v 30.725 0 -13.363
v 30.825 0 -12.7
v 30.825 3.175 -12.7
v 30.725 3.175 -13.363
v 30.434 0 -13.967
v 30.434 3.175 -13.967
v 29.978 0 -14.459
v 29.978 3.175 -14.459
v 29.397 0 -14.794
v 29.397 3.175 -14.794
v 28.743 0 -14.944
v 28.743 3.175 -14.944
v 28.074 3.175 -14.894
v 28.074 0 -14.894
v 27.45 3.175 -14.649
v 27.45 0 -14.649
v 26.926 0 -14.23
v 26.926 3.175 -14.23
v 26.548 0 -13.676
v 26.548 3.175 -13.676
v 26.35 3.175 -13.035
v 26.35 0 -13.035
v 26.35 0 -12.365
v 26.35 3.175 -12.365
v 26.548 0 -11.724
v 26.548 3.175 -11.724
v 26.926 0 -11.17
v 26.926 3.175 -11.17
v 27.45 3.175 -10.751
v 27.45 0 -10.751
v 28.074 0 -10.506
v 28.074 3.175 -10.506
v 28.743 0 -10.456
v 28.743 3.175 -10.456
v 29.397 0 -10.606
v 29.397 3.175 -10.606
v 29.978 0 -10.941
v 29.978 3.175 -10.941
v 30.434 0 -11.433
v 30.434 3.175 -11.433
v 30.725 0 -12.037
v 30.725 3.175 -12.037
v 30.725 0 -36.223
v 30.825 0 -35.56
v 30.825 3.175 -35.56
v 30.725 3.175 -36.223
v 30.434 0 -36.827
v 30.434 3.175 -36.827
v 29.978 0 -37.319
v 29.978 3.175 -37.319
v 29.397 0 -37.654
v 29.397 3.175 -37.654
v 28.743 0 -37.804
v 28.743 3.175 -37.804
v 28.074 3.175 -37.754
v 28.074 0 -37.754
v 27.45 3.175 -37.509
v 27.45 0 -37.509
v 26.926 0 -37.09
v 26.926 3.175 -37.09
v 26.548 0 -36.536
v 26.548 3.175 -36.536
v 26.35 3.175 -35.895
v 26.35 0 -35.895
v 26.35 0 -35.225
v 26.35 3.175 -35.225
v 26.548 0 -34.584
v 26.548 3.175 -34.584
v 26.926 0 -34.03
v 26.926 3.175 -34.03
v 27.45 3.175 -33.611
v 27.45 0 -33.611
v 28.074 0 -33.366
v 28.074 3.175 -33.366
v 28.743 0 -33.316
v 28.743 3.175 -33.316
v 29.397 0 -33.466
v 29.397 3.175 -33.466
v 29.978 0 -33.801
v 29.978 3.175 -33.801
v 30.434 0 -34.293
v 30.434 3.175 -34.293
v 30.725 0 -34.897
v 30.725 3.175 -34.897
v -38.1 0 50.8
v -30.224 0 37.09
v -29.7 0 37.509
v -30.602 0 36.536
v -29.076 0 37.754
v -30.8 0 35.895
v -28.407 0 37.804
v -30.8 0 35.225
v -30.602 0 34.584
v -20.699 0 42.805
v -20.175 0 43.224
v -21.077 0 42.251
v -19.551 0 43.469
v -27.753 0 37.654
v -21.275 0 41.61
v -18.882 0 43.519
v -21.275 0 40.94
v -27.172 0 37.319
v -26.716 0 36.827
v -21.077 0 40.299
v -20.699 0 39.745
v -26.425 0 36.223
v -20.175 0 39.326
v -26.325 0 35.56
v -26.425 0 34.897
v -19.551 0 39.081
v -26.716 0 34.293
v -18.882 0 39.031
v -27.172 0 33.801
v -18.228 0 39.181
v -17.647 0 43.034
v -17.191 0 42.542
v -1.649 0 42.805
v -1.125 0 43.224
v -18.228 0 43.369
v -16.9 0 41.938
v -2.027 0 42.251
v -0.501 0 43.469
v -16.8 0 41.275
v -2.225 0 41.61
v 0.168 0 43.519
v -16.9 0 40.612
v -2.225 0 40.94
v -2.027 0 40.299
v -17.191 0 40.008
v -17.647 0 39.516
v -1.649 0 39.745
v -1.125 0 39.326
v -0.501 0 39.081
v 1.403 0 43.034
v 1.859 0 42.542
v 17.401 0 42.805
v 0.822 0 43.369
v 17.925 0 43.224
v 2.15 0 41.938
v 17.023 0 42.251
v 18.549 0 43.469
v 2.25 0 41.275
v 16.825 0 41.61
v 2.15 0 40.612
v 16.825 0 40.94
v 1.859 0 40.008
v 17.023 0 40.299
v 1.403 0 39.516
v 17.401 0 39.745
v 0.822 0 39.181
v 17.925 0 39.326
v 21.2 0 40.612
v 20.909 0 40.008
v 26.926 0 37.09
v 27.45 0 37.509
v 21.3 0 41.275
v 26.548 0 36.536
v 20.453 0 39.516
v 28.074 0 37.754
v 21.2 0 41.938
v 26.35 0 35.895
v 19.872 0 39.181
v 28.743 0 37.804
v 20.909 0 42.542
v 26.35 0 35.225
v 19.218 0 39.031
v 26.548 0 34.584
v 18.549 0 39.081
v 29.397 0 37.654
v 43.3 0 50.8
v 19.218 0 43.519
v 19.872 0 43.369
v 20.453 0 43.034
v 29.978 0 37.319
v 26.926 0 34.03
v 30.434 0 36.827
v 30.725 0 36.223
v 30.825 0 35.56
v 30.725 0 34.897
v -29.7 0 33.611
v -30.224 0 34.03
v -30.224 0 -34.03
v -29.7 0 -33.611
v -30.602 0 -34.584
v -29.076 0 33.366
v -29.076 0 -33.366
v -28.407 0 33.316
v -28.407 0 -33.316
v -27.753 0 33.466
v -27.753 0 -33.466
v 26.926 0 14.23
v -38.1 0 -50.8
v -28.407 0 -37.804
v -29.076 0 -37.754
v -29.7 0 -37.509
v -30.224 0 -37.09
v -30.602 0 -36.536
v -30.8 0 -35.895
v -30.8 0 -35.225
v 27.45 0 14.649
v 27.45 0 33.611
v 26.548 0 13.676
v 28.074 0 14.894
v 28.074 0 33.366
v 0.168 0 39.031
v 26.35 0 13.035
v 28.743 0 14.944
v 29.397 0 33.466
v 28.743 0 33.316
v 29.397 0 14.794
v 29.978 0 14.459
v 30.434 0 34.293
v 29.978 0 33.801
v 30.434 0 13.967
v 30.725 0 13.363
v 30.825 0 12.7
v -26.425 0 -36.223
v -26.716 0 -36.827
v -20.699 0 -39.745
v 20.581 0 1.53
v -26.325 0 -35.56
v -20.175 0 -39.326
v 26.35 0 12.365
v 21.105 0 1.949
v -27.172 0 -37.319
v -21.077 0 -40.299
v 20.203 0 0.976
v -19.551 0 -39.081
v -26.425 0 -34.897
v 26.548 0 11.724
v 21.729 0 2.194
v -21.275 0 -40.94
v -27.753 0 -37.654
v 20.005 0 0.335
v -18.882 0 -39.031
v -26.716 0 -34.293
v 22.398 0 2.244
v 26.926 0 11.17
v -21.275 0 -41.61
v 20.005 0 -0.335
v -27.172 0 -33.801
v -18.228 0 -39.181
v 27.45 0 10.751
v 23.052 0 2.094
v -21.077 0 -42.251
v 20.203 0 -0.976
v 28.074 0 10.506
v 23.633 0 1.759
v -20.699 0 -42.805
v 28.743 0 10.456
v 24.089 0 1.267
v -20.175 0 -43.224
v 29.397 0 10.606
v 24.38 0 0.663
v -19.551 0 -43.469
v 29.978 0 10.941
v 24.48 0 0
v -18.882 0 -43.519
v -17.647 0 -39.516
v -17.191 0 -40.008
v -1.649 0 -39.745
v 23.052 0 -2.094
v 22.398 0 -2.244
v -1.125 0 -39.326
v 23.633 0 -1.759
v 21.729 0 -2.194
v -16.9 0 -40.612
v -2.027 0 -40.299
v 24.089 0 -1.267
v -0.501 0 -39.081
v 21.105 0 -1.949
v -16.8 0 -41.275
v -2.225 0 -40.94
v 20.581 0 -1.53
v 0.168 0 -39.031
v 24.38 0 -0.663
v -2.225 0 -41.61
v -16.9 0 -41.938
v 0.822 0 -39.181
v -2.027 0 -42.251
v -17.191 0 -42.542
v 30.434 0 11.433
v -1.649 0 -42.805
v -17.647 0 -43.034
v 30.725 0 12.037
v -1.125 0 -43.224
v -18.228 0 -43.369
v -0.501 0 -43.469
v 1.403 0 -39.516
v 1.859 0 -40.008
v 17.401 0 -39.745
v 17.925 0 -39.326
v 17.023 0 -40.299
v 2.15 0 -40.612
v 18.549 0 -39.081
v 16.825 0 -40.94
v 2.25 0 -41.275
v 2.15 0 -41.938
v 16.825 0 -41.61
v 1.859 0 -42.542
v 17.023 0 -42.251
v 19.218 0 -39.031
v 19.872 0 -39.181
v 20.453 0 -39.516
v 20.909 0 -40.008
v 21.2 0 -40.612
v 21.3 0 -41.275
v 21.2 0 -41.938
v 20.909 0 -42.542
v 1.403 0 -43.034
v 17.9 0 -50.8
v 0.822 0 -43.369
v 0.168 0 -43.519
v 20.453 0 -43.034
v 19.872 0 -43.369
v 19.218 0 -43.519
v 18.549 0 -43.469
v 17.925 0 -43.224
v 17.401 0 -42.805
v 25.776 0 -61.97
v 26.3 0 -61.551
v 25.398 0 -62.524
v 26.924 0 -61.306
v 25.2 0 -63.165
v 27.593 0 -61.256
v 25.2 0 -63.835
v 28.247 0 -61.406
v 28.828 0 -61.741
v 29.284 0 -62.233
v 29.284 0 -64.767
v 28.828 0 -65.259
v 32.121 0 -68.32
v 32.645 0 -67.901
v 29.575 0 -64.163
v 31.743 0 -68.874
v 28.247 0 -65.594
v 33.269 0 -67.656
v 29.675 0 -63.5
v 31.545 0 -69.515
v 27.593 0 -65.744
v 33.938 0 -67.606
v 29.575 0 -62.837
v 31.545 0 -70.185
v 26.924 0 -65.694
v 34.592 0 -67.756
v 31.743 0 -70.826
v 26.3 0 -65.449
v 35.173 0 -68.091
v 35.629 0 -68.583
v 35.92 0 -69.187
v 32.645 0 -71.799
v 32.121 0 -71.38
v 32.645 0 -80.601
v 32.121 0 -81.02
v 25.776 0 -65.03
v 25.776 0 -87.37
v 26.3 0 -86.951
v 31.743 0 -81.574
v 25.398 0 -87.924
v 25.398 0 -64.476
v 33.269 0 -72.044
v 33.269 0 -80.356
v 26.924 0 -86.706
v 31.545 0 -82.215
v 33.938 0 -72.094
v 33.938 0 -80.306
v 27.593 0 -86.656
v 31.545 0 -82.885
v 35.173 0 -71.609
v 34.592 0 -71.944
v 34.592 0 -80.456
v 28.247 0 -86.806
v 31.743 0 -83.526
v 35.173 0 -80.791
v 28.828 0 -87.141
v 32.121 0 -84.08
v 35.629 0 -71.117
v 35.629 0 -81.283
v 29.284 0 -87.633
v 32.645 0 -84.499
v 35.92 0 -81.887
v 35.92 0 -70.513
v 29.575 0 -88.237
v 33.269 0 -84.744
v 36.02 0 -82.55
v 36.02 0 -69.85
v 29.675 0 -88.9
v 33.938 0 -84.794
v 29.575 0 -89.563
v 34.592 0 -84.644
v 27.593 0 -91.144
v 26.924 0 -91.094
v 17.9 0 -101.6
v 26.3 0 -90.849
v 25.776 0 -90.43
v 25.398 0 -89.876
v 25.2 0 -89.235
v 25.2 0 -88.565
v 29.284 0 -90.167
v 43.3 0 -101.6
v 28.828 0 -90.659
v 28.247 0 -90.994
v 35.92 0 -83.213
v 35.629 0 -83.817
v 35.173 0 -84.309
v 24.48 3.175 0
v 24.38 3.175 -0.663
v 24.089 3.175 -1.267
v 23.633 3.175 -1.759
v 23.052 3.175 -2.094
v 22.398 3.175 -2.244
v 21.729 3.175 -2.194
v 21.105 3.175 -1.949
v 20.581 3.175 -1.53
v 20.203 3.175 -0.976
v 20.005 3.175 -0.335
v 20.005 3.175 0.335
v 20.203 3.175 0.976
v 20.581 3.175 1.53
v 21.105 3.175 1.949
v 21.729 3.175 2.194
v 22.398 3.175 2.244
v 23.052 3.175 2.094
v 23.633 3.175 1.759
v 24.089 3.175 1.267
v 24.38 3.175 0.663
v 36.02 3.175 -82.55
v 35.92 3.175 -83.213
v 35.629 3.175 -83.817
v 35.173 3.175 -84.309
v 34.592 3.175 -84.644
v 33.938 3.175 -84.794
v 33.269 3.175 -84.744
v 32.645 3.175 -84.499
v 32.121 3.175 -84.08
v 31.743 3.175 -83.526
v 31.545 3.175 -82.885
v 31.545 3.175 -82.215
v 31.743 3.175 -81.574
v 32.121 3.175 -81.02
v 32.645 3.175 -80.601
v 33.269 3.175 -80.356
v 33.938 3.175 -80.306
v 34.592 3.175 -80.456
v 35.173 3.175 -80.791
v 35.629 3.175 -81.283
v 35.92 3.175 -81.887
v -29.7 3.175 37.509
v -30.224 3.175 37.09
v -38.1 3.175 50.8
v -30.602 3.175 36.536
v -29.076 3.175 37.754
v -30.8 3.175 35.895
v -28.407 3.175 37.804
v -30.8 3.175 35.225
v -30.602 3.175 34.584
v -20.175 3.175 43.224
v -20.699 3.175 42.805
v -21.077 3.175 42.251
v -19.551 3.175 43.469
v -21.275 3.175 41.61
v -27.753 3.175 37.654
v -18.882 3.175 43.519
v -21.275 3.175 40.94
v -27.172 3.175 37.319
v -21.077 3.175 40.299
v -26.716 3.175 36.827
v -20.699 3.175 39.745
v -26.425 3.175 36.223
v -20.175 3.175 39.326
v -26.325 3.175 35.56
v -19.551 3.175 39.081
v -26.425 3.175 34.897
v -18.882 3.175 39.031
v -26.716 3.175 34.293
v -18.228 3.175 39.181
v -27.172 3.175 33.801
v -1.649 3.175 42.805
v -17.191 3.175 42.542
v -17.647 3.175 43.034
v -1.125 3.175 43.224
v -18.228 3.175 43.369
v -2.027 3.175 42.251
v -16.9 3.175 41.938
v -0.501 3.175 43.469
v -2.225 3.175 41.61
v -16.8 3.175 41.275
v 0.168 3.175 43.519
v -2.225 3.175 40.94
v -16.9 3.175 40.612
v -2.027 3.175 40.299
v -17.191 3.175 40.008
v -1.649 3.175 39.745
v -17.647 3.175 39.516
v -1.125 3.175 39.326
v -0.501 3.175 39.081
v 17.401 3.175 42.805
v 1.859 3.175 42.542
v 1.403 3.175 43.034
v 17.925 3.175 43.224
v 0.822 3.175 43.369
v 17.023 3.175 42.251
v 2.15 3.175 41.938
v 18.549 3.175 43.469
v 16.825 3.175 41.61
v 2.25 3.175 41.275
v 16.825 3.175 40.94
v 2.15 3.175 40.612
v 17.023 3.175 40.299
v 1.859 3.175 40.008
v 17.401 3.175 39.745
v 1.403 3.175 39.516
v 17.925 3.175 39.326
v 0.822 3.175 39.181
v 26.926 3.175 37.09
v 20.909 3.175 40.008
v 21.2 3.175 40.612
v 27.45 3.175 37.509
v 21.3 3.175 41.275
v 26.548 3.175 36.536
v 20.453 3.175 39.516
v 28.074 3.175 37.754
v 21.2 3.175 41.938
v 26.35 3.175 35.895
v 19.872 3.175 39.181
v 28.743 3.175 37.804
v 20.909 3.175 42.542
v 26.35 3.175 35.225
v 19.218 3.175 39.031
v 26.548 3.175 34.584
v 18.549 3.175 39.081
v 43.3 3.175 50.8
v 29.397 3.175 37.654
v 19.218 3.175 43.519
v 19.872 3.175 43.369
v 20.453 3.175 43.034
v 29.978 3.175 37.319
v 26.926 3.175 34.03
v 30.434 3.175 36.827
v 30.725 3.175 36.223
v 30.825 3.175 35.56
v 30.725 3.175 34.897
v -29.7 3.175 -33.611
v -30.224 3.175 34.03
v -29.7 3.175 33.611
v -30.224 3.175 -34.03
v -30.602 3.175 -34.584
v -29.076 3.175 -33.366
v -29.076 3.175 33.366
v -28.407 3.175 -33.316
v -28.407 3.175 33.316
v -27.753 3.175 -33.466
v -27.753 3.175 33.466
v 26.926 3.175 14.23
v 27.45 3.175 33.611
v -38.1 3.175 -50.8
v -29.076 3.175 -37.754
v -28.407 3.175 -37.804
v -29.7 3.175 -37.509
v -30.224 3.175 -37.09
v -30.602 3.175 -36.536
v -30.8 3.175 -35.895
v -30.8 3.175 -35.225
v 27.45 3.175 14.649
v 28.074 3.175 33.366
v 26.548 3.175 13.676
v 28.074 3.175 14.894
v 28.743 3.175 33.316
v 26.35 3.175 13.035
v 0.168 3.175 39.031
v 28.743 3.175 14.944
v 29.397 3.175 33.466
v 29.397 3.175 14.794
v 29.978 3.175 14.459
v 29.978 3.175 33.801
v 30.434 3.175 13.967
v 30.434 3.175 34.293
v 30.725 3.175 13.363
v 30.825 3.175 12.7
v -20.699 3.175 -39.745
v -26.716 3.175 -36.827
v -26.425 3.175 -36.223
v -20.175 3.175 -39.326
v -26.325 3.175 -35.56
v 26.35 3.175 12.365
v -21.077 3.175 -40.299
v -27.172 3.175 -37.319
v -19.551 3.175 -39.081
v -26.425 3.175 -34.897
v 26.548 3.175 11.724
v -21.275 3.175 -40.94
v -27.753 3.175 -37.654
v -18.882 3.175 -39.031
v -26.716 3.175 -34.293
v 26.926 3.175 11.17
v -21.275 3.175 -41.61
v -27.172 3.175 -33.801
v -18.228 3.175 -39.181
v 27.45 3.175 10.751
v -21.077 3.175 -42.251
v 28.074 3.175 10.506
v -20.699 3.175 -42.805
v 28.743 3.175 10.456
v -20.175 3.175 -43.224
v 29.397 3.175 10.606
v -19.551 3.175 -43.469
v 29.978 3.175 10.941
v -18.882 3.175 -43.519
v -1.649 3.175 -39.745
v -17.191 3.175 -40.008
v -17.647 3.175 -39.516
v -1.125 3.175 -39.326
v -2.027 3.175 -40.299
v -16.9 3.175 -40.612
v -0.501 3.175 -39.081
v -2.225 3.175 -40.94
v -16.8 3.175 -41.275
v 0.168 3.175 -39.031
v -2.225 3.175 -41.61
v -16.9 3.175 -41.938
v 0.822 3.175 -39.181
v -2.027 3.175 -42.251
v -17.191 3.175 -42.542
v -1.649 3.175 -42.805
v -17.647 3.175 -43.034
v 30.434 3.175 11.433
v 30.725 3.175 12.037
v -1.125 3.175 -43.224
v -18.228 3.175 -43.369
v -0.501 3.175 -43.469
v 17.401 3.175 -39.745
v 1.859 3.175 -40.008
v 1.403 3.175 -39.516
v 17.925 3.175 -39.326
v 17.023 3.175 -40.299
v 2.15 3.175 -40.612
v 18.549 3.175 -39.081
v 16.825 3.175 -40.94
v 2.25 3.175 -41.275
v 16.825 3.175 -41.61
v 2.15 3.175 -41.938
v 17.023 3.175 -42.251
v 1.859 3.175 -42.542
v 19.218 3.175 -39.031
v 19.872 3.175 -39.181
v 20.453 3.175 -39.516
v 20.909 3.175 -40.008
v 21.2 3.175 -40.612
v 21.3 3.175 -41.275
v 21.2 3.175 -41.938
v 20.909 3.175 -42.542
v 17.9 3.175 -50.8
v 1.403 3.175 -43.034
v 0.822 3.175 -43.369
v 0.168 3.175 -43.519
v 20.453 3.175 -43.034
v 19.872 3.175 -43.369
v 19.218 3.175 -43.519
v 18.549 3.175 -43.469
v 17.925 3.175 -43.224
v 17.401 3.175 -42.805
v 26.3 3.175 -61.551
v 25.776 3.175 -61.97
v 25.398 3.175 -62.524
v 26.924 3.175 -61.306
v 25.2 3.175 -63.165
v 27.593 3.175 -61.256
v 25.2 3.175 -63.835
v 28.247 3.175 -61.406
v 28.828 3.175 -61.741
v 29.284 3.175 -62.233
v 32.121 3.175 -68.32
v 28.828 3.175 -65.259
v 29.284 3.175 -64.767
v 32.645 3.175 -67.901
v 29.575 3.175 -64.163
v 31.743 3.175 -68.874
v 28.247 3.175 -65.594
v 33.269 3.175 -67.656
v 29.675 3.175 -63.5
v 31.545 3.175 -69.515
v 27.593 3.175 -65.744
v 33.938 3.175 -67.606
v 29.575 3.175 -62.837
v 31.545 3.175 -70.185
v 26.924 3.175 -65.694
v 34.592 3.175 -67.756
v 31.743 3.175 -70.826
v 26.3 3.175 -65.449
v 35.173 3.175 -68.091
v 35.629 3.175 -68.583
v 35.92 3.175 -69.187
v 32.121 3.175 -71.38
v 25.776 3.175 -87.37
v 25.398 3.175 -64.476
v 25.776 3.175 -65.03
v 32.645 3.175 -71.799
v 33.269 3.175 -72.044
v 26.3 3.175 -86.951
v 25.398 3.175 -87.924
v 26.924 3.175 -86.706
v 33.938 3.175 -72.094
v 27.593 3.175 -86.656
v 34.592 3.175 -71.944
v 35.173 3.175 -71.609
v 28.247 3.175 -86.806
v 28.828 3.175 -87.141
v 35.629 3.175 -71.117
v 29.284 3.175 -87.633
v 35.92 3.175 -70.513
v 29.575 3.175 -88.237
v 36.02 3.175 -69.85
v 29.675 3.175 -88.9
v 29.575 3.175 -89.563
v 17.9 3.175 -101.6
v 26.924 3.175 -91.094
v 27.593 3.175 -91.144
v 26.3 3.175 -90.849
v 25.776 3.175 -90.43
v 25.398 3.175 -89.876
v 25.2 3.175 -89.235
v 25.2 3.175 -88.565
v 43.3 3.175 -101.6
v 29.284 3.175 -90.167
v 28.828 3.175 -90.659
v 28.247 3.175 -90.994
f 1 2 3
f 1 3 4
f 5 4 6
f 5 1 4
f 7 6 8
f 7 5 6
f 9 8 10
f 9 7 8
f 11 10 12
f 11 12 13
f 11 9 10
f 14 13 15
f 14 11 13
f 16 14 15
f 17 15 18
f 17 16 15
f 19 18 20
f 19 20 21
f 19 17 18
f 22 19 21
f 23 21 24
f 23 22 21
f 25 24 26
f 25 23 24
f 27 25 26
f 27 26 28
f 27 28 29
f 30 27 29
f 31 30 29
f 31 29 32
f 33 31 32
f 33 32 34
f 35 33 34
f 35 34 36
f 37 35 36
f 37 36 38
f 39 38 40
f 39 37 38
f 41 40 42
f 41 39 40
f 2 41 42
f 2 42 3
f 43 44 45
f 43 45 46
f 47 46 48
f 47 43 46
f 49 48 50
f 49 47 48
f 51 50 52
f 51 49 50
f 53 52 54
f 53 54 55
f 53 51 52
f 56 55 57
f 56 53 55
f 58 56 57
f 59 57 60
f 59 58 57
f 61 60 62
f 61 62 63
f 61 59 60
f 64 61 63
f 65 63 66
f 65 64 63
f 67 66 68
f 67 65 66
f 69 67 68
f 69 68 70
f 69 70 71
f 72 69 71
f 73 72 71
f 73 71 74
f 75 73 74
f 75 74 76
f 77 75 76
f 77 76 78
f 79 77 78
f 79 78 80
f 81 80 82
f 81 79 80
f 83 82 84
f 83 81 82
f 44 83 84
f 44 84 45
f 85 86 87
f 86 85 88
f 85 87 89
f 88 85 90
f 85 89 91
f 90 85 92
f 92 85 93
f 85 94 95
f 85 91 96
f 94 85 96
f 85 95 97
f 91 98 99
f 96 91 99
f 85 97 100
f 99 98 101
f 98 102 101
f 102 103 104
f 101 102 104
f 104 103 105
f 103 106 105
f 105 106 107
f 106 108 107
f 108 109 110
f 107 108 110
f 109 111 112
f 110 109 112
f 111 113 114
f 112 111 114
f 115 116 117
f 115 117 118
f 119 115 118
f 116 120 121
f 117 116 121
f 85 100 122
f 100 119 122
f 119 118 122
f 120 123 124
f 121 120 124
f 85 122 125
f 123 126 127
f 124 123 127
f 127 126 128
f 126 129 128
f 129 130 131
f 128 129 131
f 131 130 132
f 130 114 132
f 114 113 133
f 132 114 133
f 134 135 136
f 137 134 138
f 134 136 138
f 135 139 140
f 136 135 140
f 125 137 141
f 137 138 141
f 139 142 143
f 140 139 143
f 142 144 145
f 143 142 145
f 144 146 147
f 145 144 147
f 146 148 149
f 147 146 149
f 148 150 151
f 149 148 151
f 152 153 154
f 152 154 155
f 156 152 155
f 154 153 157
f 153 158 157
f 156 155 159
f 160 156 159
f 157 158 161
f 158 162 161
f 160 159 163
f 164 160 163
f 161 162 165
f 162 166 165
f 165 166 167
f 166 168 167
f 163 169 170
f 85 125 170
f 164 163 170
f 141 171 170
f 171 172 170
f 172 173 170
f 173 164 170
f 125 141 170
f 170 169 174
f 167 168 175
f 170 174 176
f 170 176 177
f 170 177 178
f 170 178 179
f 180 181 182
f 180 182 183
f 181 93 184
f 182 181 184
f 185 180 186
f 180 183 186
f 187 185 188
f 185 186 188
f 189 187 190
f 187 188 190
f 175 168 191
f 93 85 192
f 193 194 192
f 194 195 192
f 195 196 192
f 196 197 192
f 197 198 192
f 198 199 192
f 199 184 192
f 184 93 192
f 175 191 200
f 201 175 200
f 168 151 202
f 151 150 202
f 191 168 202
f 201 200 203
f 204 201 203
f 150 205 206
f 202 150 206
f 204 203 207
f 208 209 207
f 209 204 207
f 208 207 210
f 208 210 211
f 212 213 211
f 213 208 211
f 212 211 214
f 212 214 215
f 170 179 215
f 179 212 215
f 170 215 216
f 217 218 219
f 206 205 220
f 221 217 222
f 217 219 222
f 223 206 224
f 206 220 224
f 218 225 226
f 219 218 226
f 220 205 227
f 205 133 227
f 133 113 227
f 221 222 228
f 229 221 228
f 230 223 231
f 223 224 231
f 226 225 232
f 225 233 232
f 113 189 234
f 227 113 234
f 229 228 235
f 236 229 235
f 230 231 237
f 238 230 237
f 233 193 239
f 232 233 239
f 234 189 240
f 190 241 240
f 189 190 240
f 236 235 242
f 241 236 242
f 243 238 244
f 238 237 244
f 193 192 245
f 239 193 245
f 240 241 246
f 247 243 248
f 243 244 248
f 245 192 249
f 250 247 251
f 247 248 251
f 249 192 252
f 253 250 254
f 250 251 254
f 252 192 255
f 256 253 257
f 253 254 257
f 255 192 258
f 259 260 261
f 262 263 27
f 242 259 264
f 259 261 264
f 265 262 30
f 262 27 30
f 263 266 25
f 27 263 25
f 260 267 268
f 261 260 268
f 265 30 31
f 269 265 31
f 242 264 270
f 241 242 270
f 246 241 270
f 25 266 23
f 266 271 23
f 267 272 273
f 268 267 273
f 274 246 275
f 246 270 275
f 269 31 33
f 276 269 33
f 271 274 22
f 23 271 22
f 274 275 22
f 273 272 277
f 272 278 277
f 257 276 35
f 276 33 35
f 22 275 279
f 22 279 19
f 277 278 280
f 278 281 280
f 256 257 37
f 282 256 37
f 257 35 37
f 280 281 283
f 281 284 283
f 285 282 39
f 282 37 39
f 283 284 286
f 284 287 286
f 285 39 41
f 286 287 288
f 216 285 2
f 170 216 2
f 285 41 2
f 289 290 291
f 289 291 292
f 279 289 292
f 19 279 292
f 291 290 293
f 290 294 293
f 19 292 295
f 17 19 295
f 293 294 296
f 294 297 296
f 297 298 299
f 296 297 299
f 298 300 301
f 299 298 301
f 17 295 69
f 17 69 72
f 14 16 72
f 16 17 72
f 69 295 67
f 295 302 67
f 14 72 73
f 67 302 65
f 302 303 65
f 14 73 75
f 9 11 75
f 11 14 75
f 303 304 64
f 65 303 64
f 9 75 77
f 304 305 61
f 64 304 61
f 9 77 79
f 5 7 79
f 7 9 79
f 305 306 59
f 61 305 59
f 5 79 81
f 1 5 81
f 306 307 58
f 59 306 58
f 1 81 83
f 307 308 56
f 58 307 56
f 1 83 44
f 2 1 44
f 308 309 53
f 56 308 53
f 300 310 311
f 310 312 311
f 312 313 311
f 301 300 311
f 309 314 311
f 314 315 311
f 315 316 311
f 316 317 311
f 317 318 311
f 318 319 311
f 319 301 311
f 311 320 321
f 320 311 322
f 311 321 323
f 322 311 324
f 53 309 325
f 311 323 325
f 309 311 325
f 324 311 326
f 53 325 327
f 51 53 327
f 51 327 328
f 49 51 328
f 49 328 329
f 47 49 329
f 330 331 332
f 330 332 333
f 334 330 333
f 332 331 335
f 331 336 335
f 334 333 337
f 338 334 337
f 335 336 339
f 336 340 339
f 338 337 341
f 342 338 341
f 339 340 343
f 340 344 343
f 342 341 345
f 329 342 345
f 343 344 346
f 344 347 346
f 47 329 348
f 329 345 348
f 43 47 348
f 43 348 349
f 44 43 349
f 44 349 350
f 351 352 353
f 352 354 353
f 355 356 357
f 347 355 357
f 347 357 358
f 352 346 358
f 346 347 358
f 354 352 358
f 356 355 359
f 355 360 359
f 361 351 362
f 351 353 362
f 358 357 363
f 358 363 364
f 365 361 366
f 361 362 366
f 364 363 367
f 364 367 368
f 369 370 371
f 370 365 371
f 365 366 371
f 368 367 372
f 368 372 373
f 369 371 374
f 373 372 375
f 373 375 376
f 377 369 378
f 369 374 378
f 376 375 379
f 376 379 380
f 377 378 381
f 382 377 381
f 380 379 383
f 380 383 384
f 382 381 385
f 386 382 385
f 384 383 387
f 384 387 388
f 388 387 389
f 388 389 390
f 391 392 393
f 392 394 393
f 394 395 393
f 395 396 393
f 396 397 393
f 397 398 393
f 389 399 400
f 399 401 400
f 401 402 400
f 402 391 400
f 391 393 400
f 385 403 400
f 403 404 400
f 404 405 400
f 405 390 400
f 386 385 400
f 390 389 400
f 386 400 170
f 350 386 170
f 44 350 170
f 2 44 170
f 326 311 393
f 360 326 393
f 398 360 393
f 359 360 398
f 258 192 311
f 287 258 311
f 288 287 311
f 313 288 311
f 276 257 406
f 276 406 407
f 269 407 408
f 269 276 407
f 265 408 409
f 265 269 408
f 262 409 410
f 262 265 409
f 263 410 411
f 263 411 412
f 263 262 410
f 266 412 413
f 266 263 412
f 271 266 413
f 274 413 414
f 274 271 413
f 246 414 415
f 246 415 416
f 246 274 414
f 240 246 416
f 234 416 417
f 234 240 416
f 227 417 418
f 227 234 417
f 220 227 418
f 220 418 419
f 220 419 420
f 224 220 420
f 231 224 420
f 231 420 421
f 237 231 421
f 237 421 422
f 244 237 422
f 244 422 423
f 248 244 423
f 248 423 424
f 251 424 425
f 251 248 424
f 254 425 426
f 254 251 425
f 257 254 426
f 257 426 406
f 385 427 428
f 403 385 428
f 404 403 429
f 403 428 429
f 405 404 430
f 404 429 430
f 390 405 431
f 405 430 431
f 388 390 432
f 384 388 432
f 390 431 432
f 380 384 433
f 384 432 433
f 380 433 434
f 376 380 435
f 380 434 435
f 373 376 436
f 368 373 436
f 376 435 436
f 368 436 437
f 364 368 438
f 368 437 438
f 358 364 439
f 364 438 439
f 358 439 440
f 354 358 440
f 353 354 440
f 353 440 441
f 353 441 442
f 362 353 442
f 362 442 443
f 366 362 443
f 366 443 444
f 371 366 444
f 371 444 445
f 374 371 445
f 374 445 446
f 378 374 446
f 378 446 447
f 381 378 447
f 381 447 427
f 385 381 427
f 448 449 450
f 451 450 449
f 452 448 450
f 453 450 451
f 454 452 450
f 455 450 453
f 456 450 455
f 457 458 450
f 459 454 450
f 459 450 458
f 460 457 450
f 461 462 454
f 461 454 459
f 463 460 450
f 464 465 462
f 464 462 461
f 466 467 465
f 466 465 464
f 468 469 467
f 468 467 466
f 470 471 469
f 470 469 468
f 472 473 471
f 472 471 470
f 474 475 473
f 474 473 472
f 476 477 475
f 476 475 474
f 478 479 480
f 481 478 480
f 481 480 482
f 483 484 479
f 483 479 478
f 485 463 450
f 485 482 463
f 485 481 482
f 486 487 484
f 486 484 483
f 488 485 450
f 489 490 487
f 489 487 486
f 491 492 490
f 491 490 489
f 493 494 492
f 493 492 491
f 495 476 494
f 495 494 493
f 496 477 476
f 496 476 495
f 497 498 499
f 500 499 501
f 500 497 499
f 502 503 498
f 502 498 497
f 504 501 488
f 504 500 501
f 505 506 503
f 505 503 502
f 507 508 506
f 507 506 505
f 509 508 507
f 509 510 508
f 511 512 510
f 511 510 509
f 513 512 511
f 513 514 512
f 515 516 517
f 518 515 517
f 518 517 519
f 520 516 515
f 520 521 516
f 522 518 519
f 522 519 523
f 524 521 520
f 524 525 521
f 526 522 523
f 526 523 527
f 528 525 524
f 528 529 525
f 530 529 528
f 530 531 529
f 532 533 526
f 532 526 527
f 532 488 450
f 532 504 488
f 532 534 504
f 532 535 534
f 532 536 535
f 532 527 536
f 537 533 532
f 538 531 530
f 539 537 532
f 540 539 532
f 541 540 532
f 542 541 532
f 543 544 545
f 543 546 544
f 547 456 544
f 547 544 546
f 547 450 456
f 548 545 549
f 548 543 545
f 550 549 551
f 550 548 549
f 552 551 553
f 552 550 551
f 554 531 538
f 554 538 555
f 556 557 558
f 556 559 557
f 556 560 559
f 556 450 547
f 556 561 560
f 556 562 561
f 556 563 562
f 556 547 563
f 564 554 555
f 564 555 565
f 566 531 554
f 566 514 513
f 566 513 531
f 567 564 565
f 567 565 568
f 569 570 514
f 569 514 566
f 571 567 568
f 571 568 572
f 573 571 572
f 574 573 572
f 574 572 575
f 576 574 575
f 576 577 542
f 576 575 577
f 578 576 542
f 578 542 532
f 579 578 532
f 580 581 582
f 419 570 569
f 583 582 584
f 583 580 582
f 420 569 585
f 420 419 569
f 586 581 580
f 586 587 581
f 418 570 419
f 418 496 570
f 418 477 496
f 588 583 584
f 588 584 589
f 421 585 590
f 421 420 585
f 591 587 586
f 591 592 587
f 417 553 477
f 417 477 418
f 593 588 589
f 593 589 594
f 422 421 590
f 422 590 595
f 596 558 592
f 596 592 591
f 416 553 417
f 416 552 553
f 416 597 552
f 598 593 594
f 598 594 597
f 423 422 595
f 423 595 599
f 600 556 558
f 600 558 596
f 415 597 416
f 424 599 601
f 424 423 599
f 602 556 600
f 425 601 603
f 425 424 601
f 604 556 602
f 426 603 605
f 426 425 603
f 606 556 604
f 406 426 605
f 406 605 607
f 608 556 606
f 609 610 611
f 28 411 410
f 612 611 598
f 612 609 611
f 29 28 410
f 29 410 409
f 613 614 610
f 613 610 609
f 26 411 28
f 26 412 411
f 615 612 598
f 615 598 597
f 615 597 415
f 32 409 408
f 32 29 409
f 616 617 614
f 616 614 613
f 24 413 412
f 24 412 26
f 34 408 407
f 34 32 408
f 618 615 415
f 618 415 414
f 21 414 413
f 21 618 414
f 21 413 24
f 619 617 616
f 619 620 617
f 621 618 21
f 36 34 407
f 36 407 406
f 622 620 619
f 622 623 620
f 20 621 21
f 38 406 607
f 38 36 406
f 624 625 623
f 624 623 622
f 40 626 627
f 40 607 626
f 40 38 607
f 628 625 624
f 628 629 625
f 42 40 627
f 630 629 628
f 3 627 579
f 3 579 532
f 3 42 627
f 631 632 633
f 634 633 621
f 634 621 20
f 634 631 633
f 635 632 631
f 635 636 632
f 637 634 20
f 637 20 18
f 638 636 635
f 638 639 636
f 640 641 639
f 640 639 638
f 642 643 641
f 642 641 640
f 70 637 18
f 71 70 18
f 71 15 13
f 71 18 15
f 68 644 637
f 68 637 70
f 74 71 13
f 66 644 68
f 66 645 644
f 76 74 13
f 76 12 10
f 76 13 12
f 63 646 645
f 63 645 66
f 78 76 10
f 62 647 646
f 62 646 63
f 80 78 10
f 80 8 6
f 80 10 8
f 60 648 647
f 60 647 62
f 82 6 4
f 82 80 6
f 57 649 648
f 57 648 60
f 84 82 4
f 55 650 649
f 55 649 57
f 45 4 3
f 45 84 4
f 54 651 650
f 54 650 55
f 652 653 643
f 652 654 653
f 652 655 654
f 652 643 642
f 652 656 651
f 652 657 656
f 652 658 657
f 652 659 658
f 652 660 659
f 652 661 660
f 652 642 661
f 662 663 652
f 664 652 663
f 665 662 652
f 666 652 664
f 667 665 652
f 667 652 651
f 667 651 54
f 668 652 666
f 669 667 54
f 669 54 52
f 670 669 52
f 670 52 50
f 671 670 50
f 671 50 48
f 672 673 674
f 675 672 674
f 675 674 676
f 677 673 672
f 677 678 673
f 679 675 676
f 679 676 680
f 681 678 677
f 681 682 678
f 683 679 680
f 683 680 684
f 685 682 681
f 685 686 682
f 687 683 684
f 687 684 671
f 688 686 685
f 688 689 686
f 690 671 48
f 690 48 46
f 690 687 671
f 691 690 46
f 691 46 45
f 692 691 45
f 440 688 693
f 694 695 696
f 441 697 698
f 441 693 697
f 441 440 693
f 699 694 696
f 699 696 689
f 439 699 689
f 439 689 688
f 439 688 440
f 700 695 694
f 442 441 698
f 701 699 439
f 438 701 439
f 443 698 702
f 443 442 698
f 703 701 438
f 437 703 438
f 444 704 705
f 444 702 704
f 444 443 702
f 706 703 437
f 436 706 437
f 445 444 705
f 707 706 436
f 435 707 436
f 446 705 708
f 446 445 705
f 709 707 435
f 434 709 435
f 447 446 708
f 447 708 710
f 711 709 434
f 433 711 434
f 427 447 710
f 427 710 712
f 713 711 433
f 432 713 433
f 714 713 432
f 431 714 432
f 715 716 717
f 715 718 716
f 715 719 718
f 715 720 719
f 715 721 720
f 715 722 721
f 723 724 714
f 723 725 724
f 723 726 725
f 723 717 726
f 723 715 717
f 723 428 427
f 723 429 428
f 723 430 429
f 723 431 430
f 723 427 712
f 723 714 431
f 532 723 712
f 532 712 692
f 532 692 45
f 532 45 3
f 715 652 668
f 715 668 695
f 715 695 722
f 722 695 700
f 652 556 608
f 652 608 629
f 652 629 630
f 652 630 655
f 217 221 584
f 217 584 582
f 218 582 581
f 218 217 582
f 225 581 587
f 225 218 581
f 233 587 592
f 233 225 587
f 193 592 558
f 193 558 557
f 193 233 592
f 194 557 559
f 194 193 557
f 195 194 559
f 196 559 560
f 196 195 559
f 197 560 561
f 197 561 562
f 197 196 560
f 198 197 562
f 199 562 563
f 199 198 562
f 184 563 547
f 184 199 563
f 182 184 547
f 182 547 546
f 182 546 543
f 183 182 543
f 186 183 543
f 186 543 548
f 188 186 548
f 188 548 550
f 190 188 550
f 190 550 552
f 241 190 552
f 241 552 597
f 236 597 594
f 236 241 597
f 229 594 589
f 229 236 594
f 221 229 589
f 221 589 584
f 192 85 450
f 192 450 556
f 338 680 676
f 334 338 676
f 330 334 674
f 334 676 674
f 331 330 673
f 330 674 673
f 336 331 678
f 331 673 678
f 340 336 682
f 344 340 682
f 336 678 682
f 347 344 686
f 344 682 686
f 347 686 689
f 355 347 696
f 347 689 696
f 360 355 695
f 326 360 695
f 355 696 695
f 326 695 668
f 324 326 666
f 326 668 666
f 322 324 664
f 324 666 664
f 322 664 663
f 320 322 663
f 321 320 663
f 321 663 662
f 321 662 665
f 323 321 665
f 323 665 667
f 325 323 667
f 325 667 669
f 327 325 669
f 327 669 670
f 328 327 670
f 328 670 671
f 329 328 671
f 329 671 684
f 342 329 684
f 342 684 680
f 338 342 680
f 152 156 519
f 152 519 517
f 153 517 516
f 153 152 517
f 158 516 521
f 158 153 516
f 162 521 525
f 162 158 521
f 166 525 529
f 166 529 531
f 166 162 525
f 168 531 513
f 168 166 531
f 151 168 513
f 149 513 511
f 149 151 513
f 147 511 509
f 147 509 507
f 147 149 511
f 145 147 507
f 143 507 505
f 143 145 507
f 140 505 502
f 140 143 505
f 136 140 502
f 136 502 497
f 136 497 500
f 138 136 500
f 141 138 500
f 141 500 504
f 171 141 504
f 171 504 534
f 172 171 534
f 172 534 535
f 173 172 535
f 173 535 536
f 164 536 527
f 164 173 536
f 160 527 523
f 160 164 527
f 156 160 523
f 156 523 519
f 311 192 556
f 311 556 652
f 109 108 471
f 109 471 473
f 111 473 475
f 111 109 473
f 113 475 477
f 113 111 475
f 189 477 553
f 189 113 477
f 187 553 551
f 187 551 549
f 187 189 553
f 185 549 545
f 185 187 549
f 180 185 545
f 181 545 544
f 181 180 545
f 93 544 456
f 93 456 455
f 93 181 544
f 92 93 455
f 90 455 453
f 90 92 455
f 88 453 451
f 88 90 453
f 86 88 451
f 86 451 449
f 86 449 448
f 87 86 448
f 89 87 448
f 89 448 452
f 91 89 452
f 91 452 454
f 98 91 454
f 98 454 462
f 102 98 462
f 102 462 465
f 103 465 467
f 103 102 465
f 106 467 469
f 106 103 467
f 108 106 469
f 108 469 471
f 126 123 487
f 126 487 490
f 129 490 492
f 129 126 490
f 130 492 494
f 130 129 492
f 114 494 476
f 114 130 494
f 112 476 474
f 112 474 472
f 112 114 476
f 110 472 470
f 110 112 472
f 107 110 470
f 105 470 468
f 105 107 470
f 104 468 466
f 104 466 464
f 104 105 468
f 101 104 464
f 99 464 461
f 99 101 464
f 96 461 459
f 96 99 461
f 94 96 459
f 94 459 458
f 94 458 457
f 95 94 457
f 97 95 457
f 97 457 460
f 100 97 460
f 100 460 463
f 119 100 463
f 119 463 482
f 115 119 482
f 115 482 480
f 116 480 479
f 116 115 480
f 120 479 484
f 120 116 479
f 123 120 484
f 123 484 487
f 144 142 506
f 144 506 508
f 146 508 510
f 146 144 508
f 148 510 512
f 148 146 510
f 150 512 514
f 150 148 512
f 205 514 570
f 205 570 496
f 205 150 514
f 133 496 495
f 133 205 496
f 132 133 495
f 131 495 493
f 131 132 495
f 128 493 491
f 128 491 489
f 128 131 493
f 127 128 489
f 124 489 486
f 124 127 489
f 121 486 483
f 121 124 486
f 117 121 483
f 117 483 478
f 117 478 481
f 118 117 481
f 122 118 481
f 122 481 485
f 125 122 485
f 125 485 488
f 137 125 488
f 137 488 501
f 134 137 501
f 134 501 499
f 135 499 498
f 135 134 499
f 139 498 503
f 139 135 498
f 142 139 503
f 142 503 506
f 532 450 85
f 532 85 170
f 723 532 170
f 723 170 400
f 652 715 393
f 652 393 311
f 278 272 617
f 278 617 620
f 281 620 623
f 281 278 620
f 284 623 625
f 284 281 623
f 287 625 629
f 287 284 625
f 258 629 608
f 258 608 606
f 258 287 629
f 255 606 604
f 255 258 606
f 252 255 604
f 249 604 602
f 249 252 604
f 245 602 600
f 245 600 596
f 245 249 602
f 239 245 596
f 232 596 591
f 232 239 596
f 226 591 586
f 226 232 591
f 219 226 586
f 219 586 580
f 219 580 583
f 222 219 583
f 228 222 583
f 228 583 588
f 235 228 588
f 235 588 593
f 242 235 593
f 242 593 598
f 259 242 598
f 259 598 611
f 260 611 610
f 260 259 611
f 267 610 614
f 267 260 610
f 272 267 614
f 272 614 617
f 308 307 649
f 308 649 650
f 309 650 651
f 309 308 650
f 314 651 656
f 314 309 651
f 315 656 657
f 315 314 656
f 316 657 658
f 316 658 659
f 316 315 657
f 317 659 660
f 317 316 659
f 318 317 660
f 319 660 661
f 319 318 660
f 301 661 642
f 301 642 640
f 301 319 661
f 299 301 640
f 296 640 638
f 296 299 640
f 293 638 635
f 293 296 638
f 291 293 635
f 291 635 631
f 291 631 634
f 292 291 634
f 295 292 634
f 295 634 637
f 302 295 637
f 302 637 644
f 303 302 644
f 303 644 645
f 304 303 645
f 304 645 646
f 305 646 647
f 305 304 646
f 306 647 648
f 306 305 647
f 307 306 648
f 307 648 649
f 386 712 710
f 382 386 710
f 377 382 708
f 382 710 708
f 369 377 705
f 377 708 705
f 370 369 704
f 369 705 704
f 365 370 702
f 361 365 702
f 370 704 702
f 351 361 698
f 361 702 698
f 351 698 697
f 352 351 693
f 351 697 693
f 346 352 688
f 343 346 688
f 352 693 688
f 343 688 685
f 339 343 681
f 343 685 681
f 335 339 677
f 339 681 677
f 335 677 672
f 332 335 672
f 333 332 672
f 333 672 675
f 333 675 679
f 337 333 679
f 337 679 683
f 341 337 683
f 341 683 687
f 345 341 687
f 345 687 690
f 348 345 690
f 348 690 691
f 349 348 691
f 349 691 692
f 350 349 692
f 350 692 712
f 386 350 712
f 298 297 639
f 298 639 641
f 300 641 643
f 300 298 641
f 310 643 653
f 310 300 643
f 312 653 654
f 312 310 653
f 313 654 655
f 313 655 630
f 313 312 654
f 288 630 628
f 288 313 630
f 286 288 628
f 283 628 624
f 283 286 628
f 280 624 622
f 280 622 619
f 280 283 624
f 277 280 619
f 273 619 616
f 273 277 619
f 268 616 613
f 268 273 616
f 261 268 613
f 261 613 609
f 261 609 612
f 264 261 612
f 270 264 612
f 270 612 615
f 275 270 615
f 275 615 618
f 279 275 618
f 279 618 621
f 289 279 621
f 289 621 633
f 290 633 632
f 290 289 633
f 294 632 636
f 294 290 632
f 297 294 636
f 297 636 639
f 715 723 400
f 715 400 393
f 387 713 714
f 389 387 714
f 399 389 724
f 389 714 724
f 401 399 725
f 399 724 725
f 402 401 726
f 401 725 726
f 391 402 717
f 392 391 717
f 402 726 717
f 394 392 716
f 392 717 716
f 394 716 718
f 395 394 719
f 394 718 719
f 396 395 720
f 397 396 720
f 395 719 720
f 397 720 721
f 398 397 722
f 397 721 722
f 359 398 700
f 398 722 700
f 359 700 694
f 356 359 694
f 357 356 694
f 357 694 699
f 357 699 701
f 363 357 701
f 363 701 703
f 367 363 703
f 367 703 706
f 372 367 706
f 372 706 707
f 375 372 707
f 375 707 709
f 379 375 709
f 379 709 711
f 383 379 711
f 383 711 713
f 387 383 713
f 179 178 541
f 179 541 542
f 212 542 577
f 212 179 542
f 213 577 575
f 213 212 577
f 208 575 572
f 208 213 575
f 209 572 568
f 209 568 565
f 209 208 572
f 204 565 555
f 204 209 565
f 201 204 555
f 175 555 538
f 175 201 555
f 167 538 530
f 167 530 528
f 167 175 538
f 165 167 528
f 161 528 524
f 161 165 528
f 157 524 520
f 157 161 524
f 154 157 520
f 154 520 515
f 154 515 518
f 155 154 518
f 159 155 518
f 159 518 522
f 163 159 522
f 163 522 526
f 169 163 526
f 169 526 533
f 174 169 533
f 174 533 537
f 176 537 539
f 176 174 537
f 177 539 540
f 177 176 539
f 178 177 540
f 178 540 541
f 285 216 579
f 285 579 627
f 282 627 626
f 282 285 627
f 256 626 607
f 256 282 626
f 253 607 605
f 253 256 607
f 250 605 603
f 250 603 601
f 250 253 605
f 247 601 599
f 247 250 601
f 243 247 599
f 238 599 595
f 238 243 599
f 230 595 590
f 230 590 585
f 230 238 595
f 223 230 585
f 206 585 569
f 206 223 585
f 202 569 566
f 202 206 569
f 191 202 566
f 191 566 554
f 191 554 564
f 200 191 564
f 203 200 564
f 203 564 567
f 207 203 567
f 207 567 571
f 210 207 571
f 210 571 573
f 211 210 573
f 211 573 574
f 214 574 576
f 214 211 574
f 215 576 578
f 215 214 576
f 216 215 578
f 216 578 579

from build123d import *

# Parameters (mm, degrees)
SKETCH1_W           = 76.2
SKETCH1_H           = 101.6
SKETCH1_R           = 2.25
BOSS_EXTRUDE1_DEPTH = 3.175
BOSS_EXTRUDE2_DEPTH = 3.175
SKETCH3_R           = 2.25
CUT_EXTRUDE1_DEPTH  = 10


with BuildPart() as part:
    # Sketch1 → Boss-Extrude1 (new body)
    with BuildSketch(Plane(origin=(0, 0, 0), x_dir=(1, 0, 0), z_dir=(0, 1, 0))):
        Rectangle(SKETCH1_W, SKETCH1_H)
        with Locations((-19.05, -41.275)):
            Circle(SKETCH1_R, mode=Mode.SUBTRACT)
        with Locations((19.05, -41.275)):
            Circle(SKETCH1_R, mode=Mode.SUBTRACT)
        with Locations((28.575, -35.56)):
            Circle(SKETCH1_R, mode=Mode.SUBTRACT)
        with Locations((-28.575, -35.56)):
            Circle(SKETCH1_R, mode=Mode.SUBTRACT)
        with Locations((28.575, 35.56)):
            Circle(SKETCH1_R, mode=Mode.SUBTRACT)
        with Locations((19.05, 41.275)):
            Circle(SKETCH1_R, mode=Mode.SUBTRACT)
        with Locations((-28.575, 35.56)):
            Circle(SKETCH1_R, mode=Mode.SUBTRACT)
        with Locations((-19.05, 41.275)):
            Circle(SKETCH1_R, mode=Mode.SUBTRACT)
        with Locations((0, -41.275)):
            Circle(SKETCH1_R, mode=Mode.SUBTRACT)
        with Locations((0, 41.275)):
            Circle(SKETCH1_R, mode=Mode.SUBTRACT)
        with Locations((28.575, 12.7)):
            Circle(SKETCH1_R, mode=Mode.SUBTRACT)
        with Locations((28.575, -12.7)):
            Circle(SKETCH1_R, mode=Mode.SUBTRACT)
        with Locations((22.23, 0)):
            Circle(SKETCH1_R, mode=Mode.SUBTRACT)
    extrude(amount=BOSS_EXTRUDE1_DEPTH)

    # Sketch2 → Boss-Extrude2 (add)
    with BuildSketch(Plane(origin=(0, 3.175, 0), x_dir=(1, 0, 0), z_dir=(0, 1, 0))):
        Polygon((38.1, -50.8), (43.3, -50.8), (43.3, 101.6), (17.9, 101.6), (17.9, 50.8), (38.1, 50.8), align=None)
    extrude(amount=-BOSS_EXTRUDE2_DEPTH)

    # Sketch3 → Cut-Extrude1 (cut)
    with BuildSketch(Plane(origin=(0, 3.175, 0), x_dir=(1, 0, 0), z_dir=(0, 1, 0))):
        with Locations((33.77, 82.55)):
            Circle(SKETCH3_R)
        with Locations((33.77, 69.85)):
            Circle(SKETCH3_R)
        with Locations((27.425, 88.9)):
            Circle(SKETCH3_R)
        with Locations((27.425, 63.5)):
            Circle(SKETCH3_R)
    extrude(amount=-CUT_EXTRUDE1_DEPTH, mode=Mode.SUBTRACT)


solid = part.part
